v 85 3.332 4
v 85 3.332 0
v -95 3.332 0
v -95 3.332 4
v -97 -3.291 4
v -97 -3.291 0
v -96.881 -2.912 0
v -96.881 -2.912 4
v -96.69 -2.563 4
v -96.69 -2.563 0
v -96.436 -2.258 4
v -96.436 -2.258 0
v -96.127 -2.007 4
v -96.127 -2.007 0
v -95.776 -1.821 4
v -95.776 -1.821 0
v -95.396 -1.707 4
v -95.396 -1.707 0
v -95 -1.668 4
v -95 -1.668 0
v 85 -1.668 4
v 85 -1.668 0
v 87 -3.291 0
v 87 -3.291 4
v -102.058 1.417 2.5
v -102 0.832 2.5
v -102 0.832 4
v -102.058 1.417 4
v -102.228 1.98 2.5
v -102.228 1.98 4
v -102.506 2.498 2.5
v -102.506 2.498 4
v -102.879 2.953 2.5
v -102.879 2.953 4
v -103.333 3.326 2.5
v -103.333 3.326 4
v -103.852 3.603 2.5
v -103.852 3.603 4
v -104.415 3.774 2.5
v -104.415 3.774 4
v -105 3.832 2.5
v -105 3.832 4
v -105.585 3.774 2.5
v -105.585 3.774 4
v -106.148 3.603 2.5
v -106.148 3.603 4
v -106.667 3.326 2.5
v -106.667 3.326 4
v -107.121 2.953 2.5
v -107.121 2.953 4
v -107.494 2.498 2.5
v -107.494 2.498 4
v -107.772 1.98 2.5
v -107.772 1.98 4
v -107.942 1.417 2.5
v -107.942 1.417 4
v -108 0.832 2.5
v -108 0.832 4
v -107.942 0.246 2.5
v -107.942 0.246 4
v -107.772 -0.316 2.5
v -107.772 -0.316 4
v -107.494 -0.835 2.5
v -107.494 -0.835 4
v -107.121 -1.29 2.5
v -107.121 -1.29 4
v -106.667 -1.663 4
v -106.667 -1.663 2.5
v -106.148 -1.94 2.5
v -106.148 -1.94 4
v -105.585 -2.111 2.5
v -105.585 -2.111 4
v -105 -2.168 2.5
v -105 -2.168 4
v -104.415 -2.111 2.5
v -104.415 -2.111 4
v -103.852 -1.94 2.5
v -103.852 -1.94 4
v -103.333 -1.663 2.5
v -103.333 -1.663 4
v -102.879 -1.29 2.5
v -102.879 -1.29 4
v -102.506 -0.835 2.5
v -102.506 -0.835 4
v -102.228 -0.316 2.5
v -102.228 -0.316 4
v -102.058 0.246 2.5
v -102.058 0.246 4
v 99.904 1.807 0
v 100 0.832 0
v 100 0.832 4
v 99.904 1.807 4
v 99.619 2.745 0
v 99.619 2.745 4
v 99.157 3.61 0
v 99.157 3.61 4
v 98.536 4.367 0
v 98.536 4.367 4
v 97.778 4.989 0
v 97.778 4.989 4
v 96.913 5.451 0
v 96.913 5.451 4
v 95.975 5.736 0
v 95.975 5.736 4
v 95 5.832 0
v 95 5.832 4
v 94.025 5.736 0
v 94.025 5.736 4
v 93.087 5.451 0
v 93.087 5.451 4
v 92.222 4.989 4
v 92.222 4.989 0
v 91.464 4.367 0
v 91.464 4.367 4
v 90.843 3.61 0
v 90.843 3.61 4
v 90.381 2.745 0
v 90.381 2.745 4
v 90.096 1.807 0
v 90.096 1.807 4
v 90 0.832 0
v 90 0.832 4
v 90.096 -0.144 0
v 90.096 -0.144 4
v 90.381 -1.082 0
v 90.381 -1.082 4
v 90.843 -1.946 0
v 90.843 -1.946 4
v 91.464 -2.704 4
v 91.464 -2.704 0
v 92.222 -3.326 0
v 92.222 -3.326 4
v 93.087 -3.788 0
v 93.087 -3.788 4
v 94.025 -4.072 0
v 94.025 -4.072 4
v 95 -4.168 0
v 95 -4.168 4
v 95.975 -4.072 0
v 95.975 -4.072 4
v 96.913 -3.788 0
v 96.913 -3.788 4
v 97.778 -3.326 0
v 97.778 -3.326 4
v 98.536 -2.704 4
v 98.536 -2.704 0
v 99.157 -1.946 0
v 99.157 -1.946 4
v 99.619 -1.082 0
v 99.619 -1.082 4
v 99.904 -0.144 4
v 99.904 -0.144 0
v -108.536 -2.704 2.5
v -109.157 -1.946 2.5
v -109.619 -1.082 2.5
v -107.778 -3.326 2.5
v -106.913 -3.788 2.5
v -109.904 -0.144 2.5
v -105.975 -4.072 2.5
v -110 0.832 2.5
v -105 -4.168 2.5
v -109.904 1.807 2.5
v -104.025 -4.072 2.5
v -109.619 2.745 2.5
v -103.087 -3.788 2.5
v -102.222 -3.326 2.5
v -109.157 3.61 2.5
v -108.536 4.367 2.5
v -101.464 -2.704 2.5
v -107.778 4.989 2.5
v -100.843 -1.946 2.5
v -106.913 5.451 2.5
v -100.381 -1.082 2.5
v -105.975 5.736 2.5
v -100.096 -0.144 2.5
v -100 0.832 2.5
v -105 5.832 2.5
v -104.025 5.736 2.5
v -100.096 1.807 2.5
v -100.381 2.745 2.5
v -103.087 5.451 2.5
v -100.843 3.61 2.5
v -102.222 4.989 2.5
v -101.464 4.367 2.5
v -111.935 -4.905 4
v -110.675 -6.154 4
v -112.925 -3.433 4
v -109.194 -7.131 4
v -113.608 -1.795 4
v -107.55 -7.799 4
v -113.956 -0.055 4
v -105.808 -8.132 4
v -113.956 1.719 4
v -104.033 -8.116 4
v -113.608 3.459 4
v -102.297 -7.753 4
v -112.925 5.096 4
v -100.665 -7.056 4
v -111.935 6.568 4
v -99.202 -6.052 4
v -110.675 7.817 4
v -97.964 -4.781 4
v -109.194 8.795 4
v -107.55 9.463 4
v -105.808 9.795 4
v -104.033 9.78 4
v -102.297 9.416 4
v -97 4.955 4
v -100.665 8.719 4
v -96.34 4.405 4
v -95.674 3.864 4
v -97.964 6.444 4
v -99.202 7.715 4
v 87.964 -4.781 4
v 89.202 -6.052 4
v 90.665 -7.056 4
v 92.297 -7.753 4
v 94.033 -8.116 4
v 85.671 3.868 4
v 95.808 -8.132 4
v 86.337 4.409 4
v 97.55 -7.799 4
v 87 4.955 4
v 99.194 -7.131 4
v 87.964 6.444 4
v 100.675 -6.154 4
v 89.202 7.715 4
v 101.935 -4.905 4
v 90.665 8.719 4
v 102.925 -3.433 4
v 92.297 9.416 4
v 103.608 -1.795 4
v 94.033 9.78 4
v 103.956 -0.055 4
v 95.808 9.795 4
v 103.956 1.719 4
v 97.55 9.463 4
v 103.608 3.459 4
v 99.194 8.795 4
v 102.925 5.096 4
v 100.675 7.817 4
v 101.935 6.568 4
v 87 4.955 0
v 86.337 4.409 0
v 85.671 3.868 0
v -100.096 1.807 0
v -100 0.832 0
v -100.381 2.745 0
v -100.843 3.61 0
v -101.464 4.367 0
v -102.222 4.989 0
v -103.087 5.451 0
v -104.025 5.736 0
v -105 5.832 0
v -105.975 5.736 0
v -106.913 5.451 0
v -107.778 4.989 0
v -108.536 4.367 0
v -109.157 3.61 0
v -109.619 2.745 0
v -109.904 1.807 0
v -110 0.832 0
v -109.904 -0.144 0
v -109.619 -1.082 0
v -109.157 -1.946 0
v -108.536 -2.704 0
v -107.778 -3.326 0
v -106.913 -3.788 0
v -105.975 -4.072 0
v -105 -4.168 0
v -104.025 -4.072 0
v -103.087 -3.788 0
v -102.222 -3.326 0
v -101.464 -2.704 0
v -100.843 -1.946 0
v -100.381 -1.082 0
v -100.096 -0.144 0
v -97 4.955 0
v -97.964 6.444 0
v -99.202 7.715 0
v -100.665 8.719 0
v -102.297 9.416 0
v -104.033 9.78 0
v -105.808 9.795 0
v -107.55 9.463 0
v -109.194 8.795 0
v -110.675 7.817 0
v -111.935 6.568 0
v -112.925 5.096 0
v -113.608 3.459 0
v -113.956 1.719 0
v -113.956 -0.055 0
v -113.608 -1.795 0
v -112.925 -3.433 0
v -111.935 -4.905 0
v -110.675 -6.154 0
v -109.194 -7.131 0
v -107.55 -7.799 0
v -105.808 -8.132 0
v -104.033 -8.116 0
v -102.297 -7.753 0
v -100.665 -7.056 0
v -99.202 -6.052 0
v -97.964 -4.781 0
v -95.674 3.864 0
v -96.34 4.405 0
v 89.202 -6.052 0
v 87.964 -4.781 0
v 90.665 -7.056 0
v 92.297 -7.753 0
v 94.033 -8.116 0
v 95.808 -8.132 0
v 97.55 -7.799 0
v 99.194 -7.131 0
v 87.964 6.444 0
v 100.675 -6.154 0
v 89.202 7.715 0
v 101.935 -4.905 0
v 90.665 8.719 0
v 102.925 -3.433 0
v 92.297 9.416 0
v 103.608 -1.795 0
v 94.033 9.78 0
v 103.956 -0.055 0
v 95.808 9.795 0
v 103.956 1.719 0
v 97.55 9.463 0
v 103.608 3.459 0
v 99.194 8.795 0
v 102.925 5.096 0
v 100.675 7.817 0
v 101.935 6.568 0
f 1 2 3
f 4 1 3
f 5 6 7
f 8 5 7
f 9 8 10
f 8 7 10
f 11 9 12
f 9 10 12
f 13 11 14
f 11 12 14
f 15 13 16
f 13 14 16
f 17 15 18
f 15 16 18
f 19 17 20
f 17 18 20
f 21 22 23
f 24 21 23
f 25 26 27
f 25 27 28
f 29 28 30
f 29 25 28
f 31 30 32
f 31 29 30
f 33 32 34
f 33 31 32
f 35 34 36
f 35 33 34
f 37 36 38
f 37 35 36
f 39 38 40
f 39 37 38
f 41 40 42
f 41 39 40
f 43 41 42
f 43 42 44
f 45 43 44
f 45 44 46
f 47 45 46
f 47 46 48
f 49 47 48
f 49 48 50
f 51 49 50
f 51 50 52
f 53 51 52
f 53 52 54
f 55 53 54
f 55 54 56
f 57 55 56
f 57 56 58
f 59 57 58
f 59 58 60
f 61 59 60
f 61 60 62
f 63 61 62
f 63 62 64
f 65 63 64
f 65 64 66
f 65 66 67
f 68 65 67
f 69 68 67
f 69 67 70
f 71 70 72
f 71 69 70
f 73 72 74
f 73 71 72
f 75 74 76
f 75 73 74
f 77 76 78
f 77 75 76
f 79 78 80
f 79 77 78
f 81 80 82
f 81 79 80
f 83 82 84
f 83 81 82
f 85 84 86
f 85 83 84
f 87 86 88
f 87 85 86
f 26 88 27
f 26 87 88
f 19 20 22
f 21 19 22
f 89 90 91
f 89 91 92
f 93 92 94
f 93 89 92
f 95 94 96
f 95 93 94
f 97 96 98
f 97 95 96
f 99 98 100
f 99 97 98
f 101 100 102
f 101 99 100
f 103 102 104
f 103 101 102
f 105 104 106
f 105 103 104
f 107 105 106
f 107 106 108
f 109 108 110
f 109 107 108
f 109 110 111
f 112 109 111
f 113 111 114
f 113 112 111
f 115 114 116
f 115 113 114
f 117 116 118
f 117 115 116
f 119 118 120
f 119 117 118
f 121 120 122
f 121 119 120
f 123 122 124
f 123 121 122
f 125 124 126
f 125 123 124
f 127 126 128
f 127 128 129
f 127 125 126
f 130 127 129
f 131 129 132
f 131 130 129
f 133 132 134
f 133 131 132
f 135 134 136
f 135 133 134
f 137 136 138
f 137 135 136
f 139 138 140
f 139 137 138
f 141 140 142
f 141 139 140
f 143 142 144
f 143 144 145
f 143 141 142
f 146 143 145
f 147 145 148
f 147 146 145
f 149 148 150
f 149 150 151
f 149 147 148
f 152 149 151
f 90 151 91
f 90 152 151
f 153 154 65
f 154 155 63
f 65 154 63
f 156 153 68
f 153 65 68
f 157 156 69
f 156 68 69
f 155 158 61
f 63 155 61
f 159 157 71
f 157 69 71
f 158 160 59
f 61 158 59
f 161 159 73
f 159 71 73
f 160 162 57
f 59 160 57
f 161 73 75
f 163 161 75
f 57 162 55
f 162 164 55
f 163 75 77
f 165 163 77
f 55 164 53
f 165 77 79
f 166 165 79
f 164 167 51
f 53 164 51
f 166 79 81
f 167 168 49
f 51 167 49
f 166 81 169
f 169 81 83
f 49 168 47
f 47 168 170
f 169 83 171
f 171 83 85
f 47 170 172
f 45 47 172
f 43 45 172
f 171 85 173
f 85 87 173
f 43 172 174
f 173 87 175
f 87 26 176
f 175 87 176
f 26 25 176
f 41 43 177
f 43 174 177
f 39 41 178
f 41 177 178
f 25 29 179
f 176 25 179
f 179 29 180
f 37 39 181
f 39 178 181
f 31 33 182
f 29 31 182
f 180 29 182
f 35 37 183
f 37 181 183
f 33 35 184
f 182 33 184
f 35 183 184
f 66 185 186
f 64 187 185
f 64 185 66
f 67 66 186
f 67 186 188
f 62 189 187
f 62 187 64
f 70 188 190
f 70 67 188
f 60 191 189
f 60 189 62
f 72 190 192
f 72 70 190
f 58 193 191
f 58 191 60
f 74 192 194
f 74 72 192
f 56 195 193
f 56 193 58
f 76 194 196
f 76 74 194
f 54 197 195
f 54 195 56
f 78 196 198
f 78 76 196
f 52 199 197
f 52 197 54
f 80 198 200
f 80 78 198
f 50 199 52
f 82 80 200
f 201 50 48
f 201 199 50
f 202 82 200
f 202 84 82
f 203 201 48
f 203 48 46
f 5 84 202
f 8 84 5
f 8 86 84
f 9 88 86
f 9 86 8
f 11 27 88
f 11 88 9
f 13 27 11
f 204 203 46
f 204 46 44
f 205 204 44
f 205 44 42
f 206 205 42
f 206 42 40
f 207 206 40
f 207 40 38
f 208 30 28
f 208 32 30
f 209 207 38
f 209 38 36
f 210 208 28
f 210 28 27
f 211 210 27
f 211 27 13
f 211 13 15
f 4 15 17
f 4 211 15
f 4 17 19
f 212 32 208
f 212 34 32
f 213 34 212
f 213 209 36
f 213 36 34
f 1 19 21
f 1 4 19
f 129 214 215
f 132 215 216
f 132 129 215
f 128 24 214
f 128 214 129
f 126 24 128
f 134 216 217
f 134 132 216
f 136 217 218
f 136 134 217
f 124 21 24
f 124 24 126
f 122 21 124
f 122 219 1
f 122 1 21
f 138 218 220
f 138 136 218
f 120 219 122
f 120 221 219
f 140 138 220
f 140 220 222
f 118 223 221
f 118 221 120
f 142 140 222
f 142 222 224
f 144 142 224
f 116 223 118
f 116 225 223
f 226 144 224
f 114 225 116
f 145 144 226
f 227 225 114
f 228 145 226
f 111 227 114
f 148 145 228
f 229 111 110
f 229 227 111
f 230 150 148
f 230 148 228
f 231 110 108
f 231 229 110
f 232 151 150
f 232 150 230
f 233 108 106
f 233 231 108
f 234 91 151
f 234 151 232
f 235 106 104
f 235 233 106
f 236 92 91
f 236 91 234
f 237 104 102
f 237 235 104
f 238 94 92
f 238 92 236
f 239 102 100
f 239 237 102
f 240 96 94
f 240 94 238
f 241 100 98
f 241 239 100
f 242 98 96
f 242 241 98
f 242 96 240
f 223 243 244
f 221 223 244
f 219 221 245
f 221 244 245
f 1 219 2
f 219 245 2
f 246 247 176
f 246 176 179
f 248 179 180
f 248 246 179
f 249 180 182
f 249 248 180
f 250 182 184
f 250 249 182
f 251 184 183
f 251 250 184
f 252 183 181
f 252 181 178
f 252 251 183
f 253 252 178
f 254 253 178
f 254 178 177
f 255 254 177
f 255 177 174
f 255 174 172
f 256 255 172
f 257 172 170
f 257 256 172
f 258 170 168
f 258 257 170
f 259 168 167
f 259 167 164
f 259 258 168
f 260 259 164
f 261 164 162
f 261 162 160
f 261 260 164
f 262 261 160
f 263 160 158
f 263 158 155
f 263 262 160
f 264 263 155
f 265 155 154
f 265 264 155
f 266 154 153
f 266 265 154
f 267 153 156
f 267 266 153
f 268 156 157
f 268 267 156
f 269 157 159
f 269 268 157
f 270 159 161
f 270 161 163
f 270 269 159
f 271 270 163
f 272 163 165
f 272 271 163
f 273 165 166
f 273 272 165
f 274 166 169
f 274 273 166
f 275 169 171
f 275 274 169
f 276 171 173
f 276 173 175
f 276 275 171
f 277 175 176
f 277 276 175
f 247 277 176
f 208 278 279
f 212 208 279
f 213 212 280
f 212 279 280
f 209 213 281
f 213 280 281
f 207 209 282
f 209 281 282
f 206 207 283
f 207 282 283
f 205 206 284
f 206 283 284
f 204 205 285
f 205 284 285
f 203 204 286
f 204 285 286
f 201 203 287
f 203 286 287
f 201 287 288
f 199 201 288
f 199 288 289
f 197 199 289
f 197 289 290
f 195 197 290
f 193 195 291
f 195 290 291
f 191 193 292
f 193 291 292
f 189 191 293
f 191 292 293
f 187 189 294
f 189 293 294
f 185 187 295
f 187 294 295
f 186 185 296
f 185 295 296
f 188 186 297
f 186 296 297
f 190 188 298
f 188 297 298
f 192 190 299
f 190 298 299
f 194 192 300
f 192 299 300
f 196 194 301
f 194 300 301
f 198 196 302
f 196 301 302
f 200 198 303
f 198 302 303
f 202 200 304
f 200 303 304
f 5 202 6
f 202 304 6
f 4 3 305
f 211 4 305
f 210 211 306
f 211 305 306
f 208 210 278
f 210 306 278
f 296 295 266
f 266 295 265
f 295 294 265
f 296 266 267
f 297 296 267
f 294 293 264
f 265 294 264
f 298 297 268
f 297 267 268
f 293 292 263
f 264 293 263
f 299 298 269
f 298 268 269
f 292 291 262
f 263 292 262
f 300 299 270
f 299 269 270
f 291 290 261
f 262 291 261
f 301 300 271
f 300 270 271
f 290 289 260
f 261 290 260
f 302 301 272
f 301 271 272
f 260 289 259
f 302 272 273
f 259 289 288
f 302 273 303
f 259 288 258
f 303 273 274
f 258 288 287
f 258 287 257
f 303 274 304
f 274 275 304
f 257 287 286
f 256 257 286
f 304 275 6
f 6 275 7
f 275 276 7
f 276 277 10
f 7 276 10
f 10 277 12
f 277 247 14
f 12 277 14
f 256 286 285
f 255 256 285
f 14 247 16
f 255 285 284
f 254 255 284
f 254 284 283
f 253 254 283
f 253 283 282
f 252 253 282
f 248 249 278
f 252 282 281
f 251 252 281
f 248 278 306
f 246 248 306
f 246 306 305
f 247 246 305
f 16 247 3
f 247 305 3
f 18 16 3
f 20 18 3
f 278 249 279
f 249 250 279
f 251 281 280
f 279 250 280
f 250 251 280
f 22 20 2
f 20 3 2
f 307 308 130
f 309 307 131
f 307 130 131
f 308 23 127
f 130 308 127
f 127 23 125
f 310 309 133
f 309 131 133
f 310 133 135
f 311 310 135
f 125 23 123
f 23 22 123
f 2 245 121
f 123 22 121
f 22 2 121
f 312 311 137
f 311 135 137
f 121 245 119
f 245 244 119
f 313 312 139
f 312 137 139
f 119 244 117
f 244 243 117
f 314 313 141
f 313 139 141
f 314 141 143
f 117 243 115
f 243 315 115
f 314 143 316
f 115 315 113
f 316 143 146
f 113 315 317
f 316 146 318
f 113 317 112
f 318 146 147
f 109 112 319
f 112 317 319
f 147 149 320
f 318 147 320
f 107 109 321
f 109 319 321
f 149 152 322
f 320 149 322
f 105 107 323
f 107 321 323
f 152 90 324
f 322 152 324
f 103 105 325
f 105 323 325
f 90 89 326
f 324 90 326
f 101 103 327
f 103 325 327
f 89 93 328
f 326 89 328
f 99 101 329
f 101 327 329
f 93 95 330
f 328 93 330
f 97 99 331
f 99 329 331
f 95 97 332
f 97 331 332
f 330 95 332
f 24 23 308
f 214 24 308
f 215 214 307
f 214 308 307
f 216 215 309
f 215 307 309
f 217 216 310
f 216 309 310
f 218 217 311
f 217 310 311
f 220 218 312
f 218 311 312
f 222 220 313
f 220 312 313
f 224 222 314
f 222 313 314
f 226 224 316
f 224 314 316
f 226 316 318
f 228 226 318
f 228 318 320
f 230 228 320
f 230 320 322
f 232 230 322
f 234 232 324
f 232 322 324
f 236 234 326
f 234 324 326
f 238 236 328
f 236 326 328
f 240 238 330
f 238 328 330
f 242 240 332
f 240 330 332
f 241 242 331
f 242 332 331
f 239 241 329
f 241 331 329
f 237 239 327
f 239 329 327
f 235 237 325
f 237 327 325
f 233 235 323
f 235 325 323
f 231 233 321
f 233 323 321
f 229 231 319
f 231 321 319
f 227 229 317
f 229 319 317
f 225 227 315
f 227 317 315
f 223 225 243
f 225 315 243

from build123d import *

# Parameters (mm, degrees)
SKETCH_1_R          = 3
SKETCH_1_R_2        = 5
EXTRUDE_1_DEPTH     = 4
SKETCH_1_3_R        = 5
CUT_EXTRUDE_1_DEPTH = 2.5


with BuildPart() as part:
    # 草图1 → 凸台-拉伸1 (new body)
    with BuildSketch(Plane.XY):
        with BuildLine():
            Line((-95, -1.668248682), (85, -1.668248682))
            Line((85, -1.668248682), (87, -3.291354308))
            ThreePointArc((87, -3.291354308), (104, 0.831751318), (87, 4.954856943))
            ThreePointArc((87, 4.954856943), (86.004567475, 4.137676062), (85, 3.331751318))
            Line((85, 3.331751318), (-95, 3.331751318))
            ThreePointArc((-95, 3.331751318), (-96.007924928, 4.133538989), (-97, 4.954856943))
            ThreePointArc((-97, 4.954856943), (-114, 0.831751318), (-97, -3.291354308))
            ThreePointArc((-97, -3.291354308), (-96.287873429, -2.125082216), (-95, -1.668248682))
        make_face()
        with Locations((-105, 0.831751318)):
            Circle(SKETCH_1_R, mode=Mode.SUBTRACT)
        with Locations((95, 0.831751318)):
            Circle(SKETCH_1_R_2, mode=Mode.SUBTRACT)
    extrude(amount=EXTRUDE_1_DEPTH)

    # 草图1<3> → 切除-拉伸1 (cut)
    with BuildSketch(Plane.XY):
        with Locations((-105, 0.831751318)):
            Circle(SKETCH_1_3_R)
    extrude(amount=CUT_EXTRUDE_1_DEPTH, mode=Mode.SUBTRACT)


solid = part.part
